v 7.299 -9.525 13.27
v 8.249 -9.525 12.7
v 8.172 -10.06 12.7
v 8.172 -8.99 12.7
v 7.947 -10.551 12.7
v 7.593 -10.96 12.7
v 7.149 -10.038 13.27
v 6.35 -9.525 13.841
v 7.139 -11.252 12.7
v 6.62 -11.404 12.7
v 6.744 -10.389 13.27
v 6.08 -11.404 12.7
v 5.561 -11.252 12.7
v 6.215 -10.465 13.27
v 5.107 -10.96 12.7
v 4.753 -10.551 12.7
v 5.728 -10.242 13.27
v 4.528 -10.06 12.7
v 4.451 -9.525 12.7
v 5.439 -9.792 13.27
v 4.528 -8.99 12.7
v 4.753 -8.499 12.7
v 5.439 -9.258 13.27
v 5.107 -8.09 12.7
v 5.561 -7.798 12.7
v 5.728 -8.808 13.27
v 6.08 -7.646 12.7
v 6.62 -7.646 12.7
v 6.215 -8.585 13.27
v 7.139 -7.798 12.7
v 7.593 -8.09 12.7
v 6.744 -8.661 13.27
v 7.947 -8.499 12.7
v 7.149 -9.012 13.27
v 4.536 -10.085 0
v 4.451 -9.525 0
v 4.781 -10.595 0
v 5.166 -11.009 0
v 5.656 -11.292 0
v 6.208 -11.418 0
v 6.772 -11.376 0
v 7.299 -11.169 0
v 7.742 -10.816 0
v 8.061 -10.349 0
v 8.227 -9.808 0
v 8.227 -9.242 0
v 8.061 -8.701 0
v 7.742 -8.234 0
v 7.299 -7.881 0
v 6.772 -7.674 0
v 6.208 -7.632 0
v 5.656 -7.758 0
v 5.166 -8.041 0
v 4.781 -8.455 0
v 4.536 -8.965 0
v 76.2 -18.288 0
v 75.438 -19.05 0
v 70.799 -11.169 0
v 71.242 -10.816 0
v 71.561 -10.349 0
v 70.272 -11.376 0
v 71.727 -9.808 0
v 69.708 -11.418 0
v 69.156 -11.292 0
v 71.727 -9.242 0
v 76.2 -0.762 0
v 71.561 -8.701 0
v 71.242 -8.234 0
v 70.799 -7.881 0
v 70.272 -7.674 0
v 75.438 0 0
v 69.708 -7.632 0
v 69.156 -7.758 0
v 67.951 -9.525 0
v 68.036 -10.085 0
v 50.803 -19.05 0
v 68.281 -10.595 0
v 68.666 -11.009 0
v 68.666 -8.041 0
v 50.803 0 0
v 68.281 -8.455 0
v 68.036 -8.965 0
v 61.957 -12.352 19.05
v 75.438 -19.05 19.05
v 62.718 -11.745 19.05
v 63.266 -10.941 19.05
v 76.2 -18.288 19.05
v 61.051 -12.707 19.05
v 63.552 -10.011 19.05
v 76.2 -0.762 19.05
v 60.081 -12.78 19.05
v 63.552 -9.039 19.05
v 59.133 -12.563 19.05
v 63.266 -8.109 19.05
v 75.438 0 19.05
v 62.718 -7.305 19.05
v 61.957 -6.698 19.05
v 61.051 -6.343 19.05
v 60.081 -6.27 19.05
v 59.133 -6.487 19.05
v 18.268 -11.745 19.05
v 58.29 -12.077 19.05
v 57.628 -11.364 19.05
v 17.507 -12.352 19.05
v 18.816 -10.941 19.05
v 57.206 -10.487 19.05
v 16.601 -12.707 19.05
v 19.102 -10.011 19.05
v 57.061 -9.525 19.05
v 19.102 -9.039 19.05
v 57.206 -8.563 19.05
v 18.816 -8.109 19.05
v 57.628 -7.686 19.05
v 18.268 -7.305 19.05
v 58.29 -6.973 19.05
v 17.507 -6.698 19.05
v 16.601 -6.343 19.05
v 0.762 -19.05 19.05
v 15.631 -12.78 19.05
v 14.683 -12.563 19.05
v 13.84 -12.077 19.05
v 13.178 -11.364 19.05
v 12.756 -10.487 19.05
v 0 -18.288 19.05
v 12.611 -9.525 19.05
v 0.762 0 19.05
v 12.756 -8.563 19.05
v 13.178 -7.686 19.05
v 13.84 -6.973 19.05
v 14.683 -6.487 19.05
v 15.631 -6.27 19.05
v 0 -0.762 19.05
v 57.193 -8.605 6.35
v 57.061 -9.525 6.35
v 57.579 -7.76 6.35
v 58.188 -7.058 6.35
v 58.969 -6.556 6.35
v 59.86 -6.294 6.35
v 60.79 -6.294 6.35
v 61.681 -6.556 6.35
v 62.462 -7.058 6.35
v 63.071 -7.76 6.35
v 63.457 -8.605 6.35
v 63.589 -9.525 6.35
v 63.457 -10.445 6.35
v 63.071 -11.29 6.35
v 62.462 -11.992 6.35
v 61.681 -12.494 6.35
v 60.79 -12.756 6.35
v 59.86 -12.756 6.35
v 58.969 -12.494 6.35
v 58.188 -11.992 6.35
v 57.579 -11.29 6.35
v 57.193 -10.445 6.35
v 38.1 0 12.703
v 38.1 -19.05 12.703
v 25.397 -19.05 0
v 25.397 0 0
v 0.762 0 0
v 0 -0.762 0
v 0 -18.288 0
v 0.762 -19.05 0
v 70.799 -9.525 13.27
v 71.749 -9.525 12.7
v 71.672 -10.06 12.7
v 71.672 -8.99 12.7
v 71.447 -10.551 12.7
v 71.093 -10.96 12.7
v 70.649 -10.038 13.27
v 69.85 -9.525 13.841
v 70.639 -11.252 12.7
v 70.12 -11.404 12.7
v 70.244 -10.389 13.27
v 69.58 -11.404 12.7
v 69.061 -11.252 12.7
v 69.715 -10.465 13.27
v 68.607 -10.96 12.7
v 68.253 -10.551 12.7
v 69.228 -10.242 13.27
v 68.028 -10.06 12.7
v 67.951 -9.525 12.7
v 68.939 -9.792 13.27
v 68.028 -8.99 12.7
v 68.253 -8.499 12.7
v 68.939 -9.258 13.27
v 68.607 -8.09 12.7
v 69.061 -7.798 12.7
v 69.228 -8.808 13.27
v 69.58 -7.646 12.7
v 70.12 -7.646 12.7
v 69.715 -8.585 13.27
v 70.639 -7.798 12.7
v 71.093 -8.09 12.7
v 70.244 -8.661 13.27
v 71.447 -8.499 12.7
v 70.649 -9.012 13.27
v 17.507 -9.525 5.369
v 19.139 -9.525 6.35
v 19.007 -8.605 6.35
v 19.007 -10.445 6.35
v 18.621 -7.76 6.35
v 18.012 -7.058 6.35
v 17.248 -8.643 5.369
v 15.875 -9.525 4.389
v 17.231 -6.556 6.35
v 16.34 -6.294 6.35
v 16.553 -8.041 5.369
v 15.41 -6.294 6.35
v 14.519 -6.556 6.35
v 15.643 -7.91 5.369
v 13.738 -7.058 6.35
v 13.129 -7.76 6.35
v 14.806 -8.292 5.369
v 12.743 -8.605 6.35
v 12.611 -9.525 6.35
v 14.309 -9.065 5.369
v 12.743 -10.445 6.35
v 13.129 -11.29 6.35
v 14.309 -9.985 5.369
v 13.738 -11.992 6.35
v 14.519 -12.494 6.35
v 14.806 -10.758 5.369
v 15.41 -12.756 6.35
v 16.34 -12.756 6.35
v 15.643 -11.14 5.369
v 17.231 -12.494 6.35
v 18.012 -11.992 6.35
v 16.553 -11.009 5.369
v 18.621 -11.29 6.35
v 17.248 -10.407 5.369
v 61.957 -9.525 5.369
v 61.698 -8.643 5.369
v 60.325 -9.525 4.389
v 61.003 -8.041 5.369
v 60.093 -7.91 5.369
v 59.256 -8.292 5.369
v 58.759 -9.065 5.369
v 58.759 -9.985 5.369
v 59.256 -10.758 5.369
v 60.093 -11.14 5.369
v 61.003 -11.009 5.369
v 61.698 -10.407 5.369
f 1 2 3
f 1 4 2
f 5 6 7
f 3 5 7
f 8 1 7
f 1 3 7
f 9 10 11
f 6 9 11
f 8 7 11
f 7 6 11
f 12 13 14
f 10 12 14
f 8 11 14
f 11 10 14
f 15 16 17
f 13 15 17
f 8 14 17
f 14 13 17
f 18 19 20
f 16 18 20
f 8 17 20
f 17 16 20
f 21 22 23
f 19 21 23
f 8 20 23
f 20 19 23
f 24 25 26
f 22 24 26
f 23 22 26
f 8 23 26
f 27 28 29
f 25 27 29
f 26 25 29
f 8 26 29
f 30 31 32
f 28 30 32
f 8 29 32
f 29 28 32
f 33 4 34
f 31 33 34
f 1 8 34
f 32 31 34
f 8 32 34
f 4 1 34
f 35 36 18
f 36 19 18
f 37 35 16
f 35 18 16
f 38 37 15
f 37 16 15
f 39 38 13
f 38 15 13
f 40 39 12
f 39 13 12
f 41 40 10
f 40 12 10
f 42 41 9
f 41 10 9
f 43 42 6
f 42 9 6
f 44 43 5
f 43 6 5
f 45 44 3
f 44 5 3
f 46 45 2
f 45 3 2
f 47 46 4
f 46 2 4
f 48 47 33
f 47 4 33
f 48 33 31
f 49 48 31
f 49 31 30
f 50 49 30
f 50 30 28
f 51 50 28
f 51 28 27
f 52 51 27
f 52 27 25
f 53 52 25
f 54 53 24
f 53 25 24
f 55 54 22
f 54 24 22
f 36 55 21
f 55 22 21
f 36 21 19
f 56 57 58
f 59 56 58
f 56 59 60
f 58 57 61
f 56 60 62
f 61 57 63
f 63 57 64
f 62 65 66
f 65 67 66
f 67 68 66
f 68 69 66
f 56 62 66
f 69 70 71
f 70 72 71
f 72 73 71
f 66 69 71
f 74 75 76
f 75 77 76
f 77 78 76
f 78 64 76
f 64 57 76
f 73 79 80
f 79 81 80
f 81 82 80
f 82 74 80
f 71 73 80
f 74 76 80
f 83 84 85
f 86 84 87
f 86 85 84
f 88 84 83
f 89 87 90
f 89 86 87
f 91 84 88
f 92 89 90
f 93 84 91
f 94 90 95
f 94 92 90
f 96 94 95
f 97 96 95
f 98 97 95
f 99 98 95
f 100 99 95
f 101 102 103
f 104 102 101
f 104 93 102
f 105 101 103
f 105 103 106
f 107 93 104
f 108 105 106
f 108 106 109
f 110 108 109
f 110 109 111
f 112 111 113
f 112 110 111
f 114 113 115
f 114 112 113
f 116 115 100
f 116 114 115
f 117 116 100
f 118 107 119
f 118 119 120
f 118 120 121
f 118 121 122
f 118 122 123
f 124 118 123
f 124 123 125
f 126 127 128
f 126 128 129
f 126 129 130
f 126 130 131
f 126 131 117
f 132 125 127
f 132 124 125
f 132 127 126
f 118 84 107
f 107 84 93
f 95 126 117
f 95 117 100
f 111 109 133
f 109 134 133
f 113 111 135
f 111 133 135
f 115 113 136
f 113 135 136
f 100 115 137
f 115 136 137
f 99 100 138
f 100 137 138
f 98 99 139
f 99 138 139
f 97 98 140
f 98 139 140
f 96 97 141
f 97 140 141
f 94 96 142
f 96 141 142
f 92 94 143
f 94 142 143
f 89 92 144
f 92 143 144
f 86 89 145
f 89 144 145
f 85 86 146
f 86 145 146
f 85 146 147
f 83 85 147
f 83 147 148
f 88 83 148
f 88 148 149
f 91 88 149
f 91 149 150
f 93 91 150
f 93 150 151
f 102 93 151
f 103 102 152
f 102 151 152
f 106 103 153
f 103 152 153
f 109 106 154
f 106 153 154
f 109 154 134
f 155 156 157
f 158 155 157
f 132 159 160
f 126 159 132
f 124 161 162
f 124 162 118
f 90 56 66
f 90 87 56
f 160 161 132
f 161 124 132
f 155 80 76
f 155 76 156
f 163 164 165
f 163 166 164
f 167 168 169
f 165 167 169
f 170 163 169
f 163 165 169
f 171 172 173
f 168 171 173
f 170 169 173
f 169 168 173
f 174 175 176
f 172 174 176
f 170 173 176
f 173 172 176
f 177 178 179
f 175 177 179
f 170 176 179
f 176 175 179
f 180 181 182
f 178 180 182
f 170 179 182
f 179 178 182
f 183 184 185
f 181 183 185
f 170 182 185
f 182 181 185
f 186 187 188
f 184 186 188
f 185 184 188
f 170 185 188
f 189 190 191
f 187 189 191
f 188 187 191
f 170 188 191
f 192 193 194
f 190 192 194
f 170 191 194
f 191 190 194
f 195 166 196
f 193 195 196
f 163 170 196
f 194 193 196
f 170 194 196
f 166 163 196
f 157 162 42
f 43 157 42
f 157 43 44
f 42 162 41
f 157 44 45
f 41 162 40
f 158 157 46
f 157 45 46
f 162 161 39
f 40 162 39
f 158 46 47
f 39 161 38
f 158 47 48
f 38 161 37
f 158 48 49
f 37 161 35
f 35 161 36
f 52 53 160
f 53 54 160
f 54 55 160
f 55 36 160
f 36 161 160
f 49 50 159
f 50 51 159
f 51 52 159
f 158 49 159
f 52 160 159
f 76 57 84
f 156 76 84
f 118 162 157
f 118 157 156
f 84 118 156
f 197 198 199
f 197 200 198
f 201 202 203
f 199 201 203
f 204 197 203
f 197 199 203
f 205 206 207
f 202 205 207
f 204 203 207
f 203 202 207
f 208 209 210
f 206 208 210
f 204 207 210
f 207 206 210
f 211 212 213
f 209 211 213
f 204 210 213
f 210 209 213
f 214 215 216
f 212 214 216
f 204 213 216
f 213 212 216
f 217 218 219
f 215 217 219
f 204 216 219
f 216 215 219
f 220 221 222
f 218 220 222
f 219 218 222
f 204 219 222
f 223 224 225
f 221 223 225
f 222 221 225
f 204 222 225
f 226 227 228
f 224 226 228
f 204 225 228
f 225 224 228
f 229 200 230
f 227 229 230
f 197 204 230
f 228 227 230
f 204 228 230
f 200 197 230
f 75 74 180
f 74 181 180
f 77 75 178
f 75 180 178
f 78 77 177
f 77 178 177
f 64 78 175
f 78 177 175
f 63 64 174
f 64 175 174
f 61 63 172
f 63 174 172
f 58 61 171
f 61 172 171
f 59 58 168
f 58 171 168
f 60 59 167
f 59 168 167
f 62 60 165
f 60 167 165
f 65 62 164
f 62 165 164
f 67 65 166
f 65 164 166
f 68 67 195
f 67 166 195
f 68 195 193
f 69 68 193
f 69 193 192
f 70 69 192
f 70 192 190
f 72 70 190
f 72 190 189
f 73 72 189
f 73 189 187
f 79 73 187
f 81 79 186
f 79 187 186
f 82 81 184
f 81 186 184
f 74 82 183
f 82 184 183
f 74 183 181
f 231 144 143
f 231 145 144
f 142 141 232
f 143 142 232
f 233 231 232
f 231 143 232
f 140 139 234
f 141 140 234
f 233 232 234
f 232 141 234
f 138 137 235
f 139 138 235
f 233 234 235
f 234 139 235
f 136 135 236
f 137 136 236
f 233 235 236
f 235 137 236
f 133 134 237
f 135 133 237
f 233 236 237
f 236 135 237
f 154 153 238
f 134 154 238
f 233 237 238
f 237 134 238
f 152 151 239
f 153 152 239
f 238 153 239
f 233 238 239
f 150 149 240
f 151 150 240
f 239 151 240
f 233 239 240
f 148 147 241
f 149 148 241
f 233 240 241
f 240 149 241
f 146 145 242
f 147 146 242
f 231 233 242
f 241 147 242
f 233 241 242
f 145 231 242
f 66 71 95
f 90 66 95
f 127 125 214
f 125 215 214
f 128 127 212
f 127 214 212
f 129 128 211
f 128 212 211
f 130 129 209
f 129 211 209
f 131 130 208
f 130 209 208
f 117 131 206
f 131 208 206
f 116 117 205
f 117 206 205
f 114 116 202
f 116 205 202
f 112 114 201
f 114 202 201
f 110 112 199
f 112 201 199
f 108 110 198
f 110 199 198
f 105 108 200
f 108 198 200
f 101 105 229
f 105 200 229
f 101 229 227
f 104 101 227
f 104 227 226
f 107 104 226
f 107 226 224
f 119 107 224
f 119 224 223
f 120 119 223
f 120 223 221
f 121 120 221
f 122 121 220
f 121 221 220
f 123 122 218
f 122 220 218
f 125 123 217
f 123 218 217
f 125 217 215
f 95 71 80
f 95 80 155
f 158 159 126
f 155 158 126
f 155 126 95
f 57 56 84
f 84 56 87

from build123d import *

# Parameters (mm, degrees)
F0_W     = 19.05
F0_H     = 19.05
F1_DEPTH = 76.2
F3_DEPTH = 25.4
F5_D     = 6.5278
F5_DEPTH = 12.7
F5_TIP   = 1.9611489744
F7_D     = 3.7973
F7_DEPTH = 12.7
F7_TIP   = 1.1408240143
F8_SIZE2 = 0.762
F8_SIZE  = 0.762


with BuildPart() as f1:
    # F0 (on Right) → F1 (new body)
    with BuildSketch(Plane.YZ):
        with Locations((-9.525, 9.525)):
            Rectangle(F0_W, F0_H)
    extrude(amount=F1_DEPTH)

    # F2 (on face) → F3 (cut)
    with BuildSketch(Plane.XZ.offset(19.05)):
        Polygon((50.8027122421, 0), (38.1, 12.7027122421), (38.1, 0), align=None)
        Polygon((38.1, 0), (38.1, 12.7027122421), (25.3972877579, 0), align=None)
    extrude(amount=-F3_DEPTH, mode=Mode.SUBTRACT)

    # F5
    with Locations(Plane.XY.offset(19.05)):
        with Locations((15.875, -9.525), (60.325, -9.525)):
            Hole(F5_D / 2, depth=F5_DEPTH)
            with Locations((0, 0, -(F5_DEPTH + F5_TIP / 2))):  # 118° drill point
                Cone(0, F5_D / 2, F5_TIP, mode=Mode.SUBTRACT)

    # F7
    with Locations(Plane(origin=(0, 0, 0), x_dir=(1, 0, 0), z_dir=(0, 0, -1))):
        with Locations((6.35, 9.525), (69.85, 9.525)):
            Hole(F7_D / 2, depth=F7_DEPTH)
            with Locations((0, 0, -(F7_DEPTH + F7_TIP / 2))):  # 118° drill point
                Cone(0, F7_D / 2, F7_TIP, mode=Mode.SUBTRACT)

    # F8
    f8_edges = [f1.edges().sort_by_distance(p)[0] for p in [
        (76.2, -19.05, 9.525),
        (76.2, 0, 9.525),
        (0, -19.05, 9.525),
        (0, 0, 9.525),
    ]]
    chamfer(f8_edges, length=F8_SIZE, length2=F8_SIZE2)


solid = f1.part
